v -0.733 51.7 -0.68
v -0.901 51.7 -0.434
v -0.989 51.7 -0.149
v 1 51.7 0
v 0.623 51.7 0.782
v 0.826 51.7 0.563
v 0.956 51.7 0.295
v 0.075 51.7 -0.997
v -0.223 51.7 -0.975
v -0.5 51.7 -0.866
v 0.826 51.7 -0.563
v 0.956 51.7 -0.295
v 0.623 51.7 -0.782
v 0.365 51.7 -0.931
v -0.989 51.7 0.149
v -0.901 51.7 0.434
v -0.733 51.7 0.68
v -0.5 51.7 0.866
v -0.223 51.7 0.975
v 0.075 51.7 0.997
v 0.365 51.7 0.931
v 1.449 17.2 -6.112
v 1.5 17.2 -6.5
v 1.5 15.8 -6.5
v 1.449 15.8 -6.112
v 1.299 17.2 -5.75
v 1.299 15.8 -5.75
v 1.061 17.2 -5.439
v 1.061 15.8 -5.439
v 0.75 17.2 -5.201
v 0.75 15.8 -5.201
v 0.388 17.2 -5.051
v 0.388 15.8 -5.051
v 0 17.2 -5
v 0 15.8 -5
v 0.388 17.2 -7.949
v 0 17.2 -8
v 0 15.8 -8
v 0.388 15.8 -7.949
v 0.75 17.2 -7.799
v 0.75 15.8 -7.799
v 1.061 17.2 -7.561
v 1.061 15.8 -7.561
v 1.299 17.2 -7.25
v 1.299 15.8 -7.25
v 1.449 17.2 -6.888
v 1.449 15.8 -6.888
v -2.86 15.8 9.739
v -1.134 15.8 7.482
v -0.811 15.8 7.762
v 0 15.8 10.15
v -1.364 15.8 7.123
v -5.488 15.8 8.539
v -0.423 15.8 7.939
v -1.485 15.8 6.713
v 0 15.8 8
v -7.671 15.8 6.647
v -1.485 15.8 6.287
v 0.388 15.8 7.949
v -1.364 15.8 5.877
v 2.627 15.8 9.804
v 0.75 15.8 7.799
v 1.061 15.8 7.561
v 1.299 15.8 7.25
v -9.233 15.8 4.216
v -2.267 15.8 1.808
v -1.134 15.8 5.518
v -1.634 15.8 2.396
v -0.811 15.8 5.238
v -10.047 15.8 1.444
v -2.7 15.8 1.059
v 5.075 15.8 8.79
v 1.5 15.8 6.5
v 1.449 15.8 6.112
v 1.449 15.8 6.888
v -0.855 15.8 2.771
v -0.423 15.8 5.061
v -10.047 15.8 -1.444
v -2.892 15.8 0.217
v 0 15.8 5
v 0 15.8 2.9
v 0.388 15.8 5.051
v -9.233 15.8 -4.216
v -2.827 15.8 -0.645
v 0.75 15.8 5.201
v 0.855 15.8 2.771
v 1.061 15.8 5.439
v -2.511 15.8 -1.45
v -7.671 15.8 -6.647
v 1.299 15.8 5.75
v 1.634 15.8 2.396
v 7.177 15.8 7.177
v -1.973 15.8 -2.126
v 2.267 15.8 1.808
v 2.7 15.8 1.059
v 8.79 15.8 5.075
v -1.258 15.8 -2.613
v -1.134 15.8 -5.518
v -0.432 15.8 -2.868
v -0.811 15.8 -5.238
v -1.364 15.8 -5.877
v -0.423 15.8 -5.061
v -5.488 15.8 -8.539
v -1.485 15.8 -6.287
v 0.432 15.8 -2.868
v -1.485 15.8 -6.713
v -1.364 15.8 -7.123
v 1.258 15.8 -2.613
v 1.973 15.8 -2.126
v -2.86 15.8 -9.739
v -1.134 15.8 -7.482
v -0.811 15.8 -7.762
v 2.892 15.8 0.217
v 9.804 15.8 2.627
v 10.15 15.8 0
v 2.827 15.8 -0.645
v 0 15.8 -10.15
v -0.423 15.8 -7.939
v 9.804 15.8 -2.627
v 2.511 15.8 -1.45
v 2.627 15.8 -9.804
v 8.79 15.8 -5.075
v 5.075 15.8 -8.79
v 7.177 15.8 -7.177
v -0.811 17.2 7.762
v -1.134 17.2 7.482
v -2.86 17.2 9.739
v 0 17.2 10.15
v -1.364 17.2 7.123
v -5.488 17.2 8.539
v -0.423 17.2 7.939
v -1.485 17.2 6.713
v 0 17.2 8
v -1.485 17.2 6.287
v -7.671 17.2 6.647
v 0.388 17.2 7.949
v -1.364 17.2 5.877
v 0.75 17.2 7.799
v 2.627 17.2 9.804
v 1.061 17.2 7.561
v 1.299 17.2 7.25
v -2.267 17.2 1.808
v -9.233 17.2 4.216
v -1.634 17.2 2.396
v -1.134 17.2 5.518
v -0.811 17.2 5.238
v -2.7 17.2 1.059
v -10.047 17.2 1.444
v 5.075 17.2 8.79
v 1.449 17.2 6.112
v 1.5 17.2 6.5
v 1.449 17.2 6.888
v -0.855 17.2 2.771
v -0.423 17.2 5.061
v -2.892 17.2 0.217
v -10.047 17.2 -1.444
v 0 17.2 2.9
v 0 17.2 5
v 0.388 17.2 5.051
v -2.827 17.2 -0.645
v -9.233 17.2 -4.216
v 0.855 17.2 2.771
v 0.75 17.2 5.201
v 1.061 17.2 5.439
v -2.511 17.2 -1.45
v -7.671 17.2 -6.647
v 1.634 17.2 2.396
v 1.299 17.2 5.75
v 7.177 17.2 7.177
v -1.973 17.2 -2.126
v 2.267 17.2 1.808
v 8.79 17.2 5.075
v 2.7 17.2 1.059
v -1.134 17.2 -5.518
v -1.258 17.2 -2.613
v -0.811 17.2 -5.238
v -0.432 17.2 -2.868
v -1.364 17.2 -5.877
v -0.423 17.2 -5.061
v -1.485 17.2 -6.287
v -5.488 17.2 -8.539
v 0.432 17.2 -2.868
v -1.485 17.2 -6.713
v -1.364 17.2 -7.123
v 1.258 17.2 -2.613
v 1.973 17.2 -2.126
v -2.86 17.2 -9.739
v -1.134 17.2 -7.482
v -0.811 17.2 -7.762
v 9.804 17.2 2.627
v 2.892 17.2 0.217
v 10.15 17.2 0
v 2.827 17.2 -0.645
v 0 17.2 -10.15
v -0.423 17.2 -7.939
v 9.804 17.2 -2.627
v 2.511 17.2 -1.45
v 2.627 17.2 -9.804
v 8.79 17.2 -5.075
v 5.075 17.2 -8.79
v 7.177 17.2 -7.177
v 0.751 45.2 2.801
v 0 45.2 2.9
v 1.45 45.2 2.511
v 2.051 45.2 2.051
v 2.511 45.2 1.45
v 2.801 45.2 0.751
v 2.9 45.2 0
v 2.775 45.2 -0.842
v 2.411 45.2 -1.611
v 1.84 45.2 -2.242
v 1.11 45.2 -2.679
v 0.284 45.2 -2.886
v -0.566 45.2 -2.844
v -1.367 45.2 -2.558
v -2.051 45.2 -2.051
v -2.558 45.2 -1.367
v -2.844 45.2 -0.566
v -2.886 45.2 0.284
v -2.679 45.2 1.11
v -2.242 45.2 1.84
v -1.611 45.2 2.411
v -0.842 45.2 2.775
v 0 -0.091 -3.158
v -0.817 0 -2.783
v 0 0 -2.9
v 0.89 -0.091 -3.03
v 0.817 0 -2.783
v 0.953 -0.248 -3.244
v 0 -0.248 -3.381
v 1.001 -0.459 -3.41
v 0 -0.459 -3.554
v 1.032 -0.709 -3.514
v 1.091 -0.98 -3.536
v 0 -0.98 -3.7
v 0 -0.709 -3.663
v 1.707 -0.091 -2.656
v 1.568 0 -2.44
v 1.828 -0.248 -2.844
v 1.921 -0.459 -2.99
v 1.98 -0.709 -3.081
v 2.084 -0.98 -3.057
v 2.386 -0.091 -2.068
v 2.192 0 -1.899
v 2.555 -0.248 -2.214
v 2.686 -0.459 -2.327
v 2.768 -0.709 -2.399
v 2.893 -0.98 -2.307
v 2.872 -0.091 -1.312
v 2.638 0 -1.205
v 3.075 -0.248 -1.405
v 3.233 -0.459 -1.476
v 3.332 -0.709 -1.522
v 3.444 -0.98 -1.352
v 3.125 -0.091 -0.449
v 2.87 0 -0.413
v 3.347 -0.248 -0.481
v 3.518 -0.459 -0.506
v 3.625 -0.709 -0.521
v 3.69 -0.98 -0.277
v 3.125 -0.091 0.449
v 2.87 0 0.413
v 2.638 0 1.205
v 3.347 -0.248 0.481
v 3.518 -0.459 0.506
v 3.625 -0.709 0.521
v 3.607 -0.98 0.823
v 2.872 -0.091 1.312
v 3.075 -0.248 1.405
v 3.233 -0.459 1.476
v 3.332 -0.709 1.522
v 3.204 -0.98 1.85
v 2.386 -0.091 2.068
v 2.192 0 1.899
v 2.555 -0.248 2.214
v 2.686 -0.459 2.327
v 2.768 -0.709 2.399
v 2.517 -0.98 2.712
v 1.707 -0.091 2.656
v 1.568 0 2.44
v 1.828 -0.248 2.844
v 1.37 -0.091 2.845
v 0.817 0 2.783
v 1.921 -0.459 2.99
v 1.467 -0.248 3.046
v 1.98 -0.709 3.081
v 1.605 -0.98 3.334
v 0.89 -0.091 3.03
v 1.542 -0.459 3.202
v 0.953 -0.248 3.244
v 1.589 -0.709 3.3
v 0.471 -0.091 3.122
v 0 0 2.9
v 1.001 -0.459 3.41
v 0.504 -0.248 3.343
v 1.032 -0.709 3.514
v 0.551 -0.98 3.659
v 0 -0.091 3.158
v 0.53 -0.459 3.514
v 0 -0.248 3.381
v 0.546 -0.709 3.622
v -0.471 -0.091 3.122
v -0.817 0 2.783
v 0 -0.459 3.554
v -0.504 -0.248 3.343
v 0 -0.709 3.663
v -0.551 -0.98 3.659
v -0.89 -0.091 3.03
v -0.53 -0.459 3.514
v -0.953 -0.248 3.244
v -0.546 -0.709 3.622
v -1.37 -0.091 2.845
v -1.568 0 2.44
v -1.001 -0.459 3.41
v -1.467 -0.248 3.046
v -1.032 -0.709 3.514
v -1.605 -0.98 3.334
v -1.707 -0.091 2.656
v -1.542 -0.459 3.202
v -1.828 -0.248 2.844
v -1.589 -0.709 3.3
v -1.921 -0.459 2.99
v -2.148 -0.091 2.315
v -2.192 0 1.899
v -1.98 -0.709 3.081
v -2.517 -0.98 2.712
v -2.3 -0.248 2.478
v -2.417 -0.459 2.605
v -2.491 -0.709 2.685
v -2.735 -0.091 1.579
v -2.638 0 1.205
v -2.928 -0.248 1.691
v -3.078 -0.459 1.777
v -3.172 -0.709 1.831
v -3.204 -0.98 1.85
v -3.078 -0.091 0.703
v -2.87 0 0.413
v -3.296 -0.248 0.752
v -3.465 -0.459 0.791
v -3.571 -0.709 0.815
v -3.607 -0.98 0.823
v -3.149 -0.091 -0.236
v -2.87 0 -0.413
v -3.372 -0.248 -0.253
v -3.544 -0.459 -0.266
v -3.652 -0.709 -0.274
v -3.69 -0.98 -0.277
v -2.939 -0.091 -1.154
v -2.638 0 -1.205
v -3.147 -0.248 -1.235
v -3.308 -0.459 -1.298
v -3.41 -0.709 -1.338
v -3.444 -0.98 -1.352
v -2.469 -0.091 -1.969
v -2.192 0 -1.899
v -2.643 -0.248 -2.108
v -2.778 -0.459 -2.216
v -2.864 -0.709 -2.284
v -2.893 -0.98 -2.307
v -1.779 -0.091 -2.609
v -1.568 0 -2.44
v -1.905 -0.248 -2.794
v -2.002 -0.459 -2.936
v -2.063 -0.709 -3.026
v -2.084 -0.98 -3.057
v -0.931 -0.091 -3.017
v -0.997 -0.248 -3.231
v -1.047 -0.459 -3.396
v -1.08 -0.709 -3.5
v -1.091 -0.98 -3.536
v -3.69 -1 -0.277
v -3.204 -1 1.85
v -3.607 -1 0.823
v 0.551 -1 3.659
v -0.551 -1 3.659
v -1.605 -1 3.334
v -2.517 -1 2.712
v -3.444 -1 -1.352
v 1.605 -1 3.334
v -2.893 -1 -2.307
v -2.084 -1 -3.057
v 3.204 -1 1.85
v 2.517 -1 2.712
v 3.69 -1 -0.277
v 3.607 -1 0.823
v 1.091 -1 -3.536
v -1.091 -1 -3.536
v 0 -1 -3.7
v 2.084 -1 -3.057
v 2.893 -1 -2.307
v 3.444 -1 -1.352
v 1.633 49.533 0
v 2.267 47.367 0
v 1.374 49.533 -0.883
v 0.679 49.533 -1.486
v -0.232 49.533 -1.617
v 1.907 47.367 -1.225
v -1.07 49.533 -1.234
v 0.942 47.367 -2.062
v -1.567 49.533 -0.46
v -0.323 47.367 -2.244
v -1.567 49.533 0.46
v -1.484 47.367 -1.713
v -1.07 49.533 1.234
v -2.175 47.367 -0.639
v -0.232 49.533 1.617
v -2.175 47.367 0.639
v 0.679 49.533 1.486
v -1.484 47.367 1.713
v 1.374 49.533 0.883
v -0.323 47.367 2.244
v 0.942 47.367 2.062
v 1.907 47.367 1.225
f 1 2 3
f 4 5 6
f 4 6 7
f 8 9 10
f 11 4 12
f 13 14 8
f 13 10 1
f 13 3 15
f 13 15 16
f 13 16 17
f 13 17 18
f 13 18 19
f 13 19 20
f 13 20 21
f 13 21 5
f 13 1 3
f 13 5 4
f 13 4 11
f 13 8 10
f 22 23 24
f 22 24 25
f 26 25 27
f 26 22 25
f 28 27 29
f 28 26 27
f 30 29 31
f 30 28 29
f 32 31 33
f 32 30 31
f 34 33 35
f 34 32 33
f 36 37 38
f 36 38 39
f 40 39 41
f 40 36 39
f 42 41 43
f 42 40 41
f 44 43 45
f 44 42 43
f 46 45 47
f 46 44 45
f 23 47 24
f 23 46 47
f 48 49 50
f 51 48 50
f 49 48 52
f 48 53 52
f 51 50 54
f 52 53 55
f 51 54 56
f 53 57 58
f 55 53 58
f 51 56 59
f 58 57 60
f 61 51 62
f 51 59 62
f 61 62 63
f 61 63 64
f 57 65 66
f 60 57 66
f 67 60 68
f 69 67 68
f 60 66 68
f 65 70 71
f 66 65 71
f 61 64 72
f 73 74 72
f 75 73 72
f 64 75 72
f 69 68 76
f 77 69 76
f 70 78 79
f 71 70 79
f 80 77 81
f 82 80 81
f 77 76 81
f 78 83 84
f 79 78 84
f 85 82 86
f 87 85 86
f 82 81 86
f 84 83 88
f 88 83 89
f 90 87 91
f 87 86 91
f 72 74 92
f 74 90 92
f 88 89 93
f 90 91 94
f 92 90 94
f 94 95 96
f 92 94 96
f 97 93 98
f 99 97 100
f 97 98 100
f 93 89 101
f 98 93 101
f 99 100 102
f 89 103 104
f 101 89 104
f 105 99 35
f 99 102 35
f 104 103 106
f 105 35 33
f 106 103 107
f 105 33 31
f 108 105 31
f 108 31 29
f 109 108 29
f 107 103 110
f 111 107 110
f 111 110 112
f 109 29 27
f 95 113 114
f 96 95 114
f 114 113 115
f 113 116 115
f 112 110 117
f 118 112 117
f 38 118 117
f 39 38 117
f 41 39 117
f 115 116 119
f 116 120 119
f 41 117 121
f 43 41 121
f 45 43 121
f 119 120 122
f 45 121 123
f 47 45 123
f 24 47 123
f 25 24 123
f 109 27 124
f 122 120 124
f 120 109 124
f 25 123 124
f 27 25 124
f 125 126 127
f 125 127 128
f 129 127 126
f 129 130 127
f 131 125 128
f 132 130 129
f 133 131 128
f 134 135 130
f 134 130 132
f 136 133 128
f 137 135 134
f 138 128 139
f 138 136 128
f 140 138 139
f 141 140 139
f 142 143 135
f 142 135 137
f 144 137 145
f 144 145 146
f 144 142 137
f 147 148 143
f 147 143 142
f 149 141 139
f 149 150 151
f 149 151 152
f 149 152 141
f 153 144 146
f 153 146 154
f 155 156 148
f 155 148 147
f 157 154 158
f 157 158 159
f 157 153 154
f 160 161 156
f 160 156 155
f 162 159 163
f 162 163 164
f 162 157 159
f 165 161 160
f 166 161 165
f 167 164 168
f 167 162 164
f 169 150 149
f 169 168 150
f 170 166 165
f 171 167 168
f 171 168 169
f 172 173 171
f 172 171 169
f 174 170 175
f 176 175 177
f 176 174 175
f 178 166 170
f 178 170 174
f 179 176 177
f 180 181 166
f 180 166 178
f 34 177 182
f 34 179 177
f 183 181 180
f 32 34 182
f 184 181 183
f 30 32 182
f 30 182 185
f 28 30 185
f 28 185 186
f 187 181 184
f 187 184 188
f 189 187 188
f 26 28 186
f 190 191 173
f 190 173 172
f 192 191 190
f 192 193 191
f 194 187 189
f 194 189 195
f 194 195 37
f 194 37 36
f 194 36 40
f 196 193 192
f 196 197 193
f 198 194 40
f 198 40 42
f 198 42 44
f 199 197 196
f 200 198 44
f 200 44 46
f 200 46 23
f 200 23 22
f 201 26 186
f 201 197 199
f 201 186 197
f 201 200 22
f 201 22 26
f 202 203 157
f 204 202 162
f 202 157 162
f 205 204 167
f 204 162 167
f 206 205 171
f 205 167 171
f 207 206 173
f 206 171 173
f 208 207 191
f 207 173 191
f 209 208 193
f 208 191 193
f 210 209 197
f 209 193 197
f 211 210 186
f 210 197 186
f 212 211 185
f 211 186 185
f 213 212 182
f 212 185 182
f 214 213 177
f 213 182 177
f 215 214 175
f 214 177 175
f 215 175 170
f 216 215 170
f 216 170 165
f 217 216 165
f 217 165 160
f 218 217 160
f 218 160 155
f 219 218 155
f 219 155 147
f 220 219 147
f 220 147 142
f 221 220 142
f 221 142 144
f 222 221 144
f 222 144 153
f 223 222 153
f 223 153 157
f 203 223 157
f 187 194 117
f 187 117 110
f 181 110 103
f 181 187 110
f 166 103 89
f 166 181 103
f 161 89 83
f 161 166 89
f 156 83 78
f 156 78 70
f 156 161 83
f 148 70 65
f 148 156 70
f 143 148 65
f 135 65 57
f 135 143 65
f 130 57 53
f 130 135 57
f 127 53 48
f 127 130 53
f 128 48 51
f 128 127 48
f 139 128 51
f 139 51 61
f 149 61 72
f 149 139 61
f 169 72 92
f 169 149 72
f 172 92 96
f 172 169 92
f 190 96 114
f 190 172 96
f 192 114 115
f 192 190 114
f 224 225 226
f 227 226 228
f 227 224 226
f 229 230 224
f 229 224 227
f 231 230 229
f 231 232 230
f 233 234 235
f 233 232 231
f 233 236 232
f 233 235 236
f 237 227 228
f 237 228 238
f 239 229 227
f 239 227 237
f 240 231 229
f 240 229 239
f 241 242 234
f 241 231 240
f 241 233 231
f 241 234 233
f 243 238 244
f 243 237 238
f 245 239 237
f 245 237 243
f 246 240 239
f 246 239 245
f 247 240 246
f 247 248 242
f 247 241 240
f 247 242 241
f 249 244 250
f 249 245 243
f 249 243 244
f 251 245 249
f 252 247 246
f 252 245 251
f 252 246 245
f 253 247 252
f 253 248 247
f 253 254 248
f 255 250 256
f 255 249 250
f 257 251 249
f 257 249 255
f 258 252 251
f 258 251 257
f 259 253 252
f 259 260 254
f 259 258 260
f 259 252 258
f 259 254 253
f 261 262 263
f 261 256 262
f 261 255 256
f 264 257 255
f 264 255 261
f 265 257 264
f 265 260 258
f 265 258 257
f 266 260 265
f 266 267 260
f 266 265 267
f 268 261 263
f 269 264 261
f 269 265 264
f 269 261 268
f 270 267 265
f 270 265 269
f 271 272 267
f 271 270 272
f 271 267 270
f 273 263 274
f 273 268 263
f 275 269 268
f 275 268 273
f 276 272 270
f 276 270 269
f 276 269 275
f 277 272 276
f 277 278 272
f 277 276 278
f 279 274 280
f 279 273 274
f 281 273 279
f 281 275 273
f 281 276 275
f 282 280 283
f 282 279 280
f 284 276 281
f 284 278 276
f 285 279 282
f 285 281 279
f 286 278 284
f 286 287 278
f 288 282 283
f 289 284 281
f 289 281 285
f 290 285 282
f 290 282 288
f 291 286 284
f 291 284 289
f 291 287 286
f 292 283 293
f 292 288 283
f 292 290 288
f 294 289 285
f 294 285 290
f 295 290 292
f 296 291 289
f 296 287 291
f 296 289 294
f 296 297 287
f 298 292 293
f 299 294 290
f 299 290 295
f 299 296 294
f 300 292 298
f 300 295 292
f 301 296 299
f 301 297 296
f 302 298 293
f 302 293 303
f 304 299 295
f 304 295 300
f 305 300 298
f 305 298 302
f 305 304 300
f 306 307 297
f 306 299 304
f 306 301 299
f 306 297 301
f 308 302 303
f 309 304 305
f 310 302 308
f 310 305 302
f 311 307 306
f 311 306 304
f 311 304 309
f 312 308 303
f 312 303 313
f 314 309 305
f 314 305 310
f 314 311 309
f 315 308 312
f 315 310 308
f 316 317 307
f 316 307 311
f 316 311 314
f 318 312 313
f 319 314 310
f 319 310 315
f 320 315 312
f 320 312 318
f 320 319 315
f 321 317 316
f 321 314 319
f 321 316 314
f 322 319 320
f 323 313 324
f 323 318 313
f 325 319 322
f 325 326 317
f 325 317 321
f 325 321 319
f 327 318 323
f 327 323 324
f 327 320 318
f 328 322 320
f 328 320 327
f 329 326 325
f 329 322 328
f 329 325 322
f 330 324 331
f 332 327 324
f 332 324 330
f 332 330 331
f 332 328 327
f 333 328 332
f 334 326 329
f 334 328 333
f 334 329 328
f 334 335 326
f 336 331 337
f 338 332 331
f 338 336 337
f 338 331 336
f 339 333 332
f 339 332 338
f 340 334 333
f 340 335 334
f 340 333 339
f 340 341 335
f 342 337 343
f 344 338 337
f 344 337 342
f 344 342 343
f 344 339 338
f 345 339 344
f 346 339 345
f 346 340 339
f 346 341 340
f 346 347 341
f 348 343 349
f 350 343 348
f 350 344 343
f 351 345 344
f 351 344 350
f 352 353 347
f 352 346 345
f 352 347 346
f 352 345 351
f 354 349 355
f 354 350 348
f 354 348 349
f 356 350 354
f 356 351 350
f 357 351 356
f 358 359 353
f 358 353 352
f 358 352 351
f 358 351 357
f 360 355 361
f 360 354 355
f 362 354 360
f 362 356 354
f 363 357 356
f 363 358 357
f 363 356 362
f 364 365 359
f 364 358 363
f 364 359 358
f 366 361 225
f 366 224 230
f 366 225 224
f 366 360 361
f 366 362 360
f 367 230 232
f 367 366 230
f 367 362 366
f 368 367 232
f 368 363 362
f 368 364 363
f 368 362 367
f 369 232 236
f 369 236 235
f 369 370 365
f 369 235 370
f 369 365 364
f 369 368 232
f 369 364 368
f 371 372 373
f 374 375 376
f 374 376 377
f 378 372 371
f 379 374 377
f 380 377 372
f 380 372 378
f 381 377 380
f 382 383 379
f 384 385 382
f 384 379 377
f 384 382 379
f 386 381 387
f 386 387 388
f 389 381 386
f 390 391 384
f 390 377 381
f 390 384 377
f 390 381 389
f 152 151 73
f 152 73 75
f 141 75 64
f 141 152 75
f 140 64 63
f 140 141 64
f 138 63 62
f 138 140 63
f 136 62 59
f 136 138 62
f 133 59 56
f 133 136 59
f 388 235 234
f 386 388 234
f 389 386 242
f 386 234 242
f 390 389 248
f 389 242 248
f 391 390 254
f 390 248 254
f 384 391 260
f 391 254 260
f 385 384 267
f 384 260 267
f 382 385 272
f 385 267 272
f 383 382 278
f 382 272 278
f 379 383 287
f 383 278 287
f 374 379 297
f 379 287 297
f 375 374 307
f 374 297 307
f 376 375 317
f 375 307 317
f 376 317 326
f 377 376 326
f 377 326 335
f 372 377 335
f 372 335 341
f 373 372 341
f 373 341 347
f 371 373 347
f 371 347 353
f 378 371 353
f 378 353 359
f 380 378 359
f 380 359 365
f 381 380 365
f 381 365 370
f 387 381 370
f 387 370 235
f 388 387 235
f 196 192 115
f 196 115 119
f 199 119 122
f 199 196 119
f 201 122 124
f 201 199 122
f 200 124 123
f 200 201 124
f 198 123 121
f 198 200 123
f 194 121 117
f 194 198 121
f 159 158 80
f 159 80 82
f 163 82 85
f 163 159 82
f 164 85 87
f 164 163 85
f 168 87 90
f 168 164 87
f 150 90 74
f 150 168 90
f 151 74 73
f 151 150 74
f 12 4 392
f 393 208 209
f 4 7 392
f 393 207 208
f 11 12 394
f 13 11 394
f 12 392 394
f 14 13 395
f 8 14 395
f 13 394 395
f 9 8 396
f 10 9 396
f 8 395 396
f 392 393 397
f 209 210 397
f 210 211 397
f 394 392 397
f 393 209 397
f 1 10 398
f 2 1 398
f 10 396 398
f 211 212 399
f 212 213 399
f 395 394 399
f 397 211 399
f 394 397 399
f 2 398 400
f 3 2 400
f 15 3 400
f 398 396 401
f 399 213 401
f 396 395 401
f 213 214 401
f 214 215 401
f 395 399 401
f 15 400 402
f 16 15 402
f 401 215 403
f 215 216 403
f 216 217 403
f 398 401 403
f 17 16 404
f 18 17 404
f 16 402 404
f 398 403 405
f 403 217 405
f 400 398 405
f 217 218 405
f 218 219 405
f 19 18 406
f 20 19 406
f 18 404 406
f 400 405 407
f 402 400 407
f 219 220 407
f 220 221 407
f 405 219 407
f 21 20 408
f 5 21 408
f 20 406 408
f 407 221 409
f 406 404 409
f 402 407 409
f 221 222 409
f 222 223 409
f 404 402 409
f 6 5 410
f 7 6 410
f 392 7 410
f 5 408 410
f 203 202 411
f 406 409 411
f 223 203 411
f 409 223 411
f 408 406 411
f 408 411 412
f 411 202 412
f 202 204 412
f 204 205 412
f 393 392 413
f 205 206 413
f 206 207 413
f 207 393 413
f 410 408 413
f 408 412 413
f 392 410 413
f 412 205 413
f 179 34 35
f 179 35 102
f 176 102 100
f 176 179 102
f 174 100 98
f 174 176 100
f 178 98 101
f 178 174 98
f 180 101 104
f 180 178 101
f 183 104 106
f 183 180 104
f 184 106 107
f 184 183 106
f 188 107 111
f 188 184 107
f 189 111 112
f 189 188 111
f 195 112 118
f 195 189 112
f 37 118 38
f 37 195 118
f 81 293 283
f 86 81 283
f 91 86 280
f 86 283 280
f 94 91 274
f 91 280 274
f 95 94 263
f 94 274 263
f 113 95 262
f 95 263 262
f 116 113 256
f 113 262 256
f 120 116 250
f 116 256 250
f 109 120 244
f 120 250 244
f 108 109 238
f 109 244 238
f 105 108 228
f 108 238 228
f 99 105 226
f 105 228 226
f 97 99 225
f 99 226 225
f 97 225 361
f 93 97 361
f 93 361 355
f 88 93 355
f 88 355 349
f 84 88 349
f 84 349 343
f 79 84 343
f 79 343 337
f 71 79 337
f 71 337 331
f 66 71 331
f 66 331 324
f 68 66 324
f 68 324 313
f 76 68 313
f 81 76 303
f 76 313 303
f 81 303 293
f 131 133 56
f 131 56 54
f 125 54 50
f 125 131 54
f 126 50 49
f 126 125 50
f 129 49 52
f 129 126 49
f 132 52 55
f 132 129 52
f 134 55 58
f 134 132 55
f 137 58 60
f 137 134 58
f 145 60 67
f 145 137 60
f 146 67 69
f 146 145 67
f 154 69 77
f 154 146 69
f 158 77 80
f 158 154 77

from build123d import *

# Parameters (mm, degrees)
SKETCH1_R           = 2.9
BOSS_EXTRUDE1_DEPTH = 45.2
SKETCH2_R           = 3.7
BOSS_EXTRUDE2_DEPTH = 1
FILLET2_R           = 1
BOSS_EXTRUDE3_DEPTH = 1.4
SKETCH4_R           = 1
SKETCH5_R           = 2.9


with BuildPart() as part:
    # Sketch1 → Boss-Extrude1 (new body)
    with BuildSketch(Plane(origin=(0, 0, 0), x_dir=(1, 0, 0), z_dir=(0, 1, 0))):
        with Locations(Location((0, 0, 0), (0, 0, 270))):
            Circle(SKETCH1_R)
    extrude(amount=BOSS_EXTRUDE1_DEPTH)

    # Sketch2 → Boss-Extrude2 (add)
    with BuildSketch(Plane.XZ):
        with Locations(Location((0, 0, 0), (0, 0, 270))):
            Circle(SKETCH2_R)
    extrude(amount=BOSS_EXTRUDE2_DEPTH)

    # Fillet2
    # the kernel refuses this fillet: 1 mm, written as the material it takes off along each edge
    with BuildSketch(Plane(origin=(0, 0, 0), x_dir=(0, 0, -1), z_dir=(-1, 0, 0))) as fillet2_piece_1:
        with BuildLine():
            CenterArc((2.7, 0.979795897), FILLET2_R, 281.536959033, 78.463040967)
            Line((2.9, 0), (2.904, -0.019595918))
            ThreePointArc((2.904, -0.019595918), (3.3, -0.02), (3.7, -0.02))
            Line((3.7, -0.02), (3.72, 0))
            Line((3.72, 0), (3.72, 0.979795897))
            Line((3.72, 0.979795897), (3.7, 0.979795897))
        make_face()
    revolve(axis=Axis((0, 0, 0), (0, -1, 0)), mode=Mode.SUBTRACT)

    # Sketch3 → Boss-Extrude3 (add)
    with BuildSketch(Plane(origin=(0, 17.2, 0), x_dir=(1, 0, 0), z_dir=(0, 1, 0))):
        with BuildLine():
            ThreePointArc((0, 10.15), (-10.15, 0), (0, -10.15))
            Line((0, -10.15), (0, -8))
            ThreePointArc((0, -8), (-1.5, -6.5), (0, -5))
            Line((0, -5), (0, 5))
            ThreePointArc((0, 5), (-1.5, 6.5), (0, 8))
            Line((0, 8), (0, 10.15))
        make_face()
        with BuildLine():
            Line((0, -8), (0, -10.15))
            ThreePointArc((0, -10.15), (7.177133829, -7.177133829), (10.15, 0))
            ThreePointArc((10.15, 0), (7.177133829, 7.177133829), (0, 10.15))
            Line((0, 10.15), (0, 8))
            ThreePointArc((0, 8), (1.060660172, 7.560660172), (1.5, 6.5))
            ThreePointArc((1.5, 6.5), (1.060660172, 5.439339828), (0, 5))
            Line((0, 5), (0, -5))
            ThreePointArc((0, -5), (1.060660172, -5.439339828), (1.5, -6.5))
            ThreePointArc((1.5, -6.5), (1.060660172, -7.560660172), (0, -8))
        make_face()
    extrude(amount=-BOSS_EXTRUDE3_DEPTH)

    # Sketch4 → Loft1 section 0
    with BuildSketch(Plane(origin=(0, 51.7, 0), x_dir=(1, 0, 0), z_dir=(0, 1, 0))):
        Circle(SKETCH4_R)
    # Sketch5 → Loft1 section 1
    with BuildSketch(Plane(origin=(0, 45.2, 0), x_dir=(1, 0, 0), z_dir=(0, 1, 0))):
        Circle(SKETCH5_R)
    loft()


solid = part.part
